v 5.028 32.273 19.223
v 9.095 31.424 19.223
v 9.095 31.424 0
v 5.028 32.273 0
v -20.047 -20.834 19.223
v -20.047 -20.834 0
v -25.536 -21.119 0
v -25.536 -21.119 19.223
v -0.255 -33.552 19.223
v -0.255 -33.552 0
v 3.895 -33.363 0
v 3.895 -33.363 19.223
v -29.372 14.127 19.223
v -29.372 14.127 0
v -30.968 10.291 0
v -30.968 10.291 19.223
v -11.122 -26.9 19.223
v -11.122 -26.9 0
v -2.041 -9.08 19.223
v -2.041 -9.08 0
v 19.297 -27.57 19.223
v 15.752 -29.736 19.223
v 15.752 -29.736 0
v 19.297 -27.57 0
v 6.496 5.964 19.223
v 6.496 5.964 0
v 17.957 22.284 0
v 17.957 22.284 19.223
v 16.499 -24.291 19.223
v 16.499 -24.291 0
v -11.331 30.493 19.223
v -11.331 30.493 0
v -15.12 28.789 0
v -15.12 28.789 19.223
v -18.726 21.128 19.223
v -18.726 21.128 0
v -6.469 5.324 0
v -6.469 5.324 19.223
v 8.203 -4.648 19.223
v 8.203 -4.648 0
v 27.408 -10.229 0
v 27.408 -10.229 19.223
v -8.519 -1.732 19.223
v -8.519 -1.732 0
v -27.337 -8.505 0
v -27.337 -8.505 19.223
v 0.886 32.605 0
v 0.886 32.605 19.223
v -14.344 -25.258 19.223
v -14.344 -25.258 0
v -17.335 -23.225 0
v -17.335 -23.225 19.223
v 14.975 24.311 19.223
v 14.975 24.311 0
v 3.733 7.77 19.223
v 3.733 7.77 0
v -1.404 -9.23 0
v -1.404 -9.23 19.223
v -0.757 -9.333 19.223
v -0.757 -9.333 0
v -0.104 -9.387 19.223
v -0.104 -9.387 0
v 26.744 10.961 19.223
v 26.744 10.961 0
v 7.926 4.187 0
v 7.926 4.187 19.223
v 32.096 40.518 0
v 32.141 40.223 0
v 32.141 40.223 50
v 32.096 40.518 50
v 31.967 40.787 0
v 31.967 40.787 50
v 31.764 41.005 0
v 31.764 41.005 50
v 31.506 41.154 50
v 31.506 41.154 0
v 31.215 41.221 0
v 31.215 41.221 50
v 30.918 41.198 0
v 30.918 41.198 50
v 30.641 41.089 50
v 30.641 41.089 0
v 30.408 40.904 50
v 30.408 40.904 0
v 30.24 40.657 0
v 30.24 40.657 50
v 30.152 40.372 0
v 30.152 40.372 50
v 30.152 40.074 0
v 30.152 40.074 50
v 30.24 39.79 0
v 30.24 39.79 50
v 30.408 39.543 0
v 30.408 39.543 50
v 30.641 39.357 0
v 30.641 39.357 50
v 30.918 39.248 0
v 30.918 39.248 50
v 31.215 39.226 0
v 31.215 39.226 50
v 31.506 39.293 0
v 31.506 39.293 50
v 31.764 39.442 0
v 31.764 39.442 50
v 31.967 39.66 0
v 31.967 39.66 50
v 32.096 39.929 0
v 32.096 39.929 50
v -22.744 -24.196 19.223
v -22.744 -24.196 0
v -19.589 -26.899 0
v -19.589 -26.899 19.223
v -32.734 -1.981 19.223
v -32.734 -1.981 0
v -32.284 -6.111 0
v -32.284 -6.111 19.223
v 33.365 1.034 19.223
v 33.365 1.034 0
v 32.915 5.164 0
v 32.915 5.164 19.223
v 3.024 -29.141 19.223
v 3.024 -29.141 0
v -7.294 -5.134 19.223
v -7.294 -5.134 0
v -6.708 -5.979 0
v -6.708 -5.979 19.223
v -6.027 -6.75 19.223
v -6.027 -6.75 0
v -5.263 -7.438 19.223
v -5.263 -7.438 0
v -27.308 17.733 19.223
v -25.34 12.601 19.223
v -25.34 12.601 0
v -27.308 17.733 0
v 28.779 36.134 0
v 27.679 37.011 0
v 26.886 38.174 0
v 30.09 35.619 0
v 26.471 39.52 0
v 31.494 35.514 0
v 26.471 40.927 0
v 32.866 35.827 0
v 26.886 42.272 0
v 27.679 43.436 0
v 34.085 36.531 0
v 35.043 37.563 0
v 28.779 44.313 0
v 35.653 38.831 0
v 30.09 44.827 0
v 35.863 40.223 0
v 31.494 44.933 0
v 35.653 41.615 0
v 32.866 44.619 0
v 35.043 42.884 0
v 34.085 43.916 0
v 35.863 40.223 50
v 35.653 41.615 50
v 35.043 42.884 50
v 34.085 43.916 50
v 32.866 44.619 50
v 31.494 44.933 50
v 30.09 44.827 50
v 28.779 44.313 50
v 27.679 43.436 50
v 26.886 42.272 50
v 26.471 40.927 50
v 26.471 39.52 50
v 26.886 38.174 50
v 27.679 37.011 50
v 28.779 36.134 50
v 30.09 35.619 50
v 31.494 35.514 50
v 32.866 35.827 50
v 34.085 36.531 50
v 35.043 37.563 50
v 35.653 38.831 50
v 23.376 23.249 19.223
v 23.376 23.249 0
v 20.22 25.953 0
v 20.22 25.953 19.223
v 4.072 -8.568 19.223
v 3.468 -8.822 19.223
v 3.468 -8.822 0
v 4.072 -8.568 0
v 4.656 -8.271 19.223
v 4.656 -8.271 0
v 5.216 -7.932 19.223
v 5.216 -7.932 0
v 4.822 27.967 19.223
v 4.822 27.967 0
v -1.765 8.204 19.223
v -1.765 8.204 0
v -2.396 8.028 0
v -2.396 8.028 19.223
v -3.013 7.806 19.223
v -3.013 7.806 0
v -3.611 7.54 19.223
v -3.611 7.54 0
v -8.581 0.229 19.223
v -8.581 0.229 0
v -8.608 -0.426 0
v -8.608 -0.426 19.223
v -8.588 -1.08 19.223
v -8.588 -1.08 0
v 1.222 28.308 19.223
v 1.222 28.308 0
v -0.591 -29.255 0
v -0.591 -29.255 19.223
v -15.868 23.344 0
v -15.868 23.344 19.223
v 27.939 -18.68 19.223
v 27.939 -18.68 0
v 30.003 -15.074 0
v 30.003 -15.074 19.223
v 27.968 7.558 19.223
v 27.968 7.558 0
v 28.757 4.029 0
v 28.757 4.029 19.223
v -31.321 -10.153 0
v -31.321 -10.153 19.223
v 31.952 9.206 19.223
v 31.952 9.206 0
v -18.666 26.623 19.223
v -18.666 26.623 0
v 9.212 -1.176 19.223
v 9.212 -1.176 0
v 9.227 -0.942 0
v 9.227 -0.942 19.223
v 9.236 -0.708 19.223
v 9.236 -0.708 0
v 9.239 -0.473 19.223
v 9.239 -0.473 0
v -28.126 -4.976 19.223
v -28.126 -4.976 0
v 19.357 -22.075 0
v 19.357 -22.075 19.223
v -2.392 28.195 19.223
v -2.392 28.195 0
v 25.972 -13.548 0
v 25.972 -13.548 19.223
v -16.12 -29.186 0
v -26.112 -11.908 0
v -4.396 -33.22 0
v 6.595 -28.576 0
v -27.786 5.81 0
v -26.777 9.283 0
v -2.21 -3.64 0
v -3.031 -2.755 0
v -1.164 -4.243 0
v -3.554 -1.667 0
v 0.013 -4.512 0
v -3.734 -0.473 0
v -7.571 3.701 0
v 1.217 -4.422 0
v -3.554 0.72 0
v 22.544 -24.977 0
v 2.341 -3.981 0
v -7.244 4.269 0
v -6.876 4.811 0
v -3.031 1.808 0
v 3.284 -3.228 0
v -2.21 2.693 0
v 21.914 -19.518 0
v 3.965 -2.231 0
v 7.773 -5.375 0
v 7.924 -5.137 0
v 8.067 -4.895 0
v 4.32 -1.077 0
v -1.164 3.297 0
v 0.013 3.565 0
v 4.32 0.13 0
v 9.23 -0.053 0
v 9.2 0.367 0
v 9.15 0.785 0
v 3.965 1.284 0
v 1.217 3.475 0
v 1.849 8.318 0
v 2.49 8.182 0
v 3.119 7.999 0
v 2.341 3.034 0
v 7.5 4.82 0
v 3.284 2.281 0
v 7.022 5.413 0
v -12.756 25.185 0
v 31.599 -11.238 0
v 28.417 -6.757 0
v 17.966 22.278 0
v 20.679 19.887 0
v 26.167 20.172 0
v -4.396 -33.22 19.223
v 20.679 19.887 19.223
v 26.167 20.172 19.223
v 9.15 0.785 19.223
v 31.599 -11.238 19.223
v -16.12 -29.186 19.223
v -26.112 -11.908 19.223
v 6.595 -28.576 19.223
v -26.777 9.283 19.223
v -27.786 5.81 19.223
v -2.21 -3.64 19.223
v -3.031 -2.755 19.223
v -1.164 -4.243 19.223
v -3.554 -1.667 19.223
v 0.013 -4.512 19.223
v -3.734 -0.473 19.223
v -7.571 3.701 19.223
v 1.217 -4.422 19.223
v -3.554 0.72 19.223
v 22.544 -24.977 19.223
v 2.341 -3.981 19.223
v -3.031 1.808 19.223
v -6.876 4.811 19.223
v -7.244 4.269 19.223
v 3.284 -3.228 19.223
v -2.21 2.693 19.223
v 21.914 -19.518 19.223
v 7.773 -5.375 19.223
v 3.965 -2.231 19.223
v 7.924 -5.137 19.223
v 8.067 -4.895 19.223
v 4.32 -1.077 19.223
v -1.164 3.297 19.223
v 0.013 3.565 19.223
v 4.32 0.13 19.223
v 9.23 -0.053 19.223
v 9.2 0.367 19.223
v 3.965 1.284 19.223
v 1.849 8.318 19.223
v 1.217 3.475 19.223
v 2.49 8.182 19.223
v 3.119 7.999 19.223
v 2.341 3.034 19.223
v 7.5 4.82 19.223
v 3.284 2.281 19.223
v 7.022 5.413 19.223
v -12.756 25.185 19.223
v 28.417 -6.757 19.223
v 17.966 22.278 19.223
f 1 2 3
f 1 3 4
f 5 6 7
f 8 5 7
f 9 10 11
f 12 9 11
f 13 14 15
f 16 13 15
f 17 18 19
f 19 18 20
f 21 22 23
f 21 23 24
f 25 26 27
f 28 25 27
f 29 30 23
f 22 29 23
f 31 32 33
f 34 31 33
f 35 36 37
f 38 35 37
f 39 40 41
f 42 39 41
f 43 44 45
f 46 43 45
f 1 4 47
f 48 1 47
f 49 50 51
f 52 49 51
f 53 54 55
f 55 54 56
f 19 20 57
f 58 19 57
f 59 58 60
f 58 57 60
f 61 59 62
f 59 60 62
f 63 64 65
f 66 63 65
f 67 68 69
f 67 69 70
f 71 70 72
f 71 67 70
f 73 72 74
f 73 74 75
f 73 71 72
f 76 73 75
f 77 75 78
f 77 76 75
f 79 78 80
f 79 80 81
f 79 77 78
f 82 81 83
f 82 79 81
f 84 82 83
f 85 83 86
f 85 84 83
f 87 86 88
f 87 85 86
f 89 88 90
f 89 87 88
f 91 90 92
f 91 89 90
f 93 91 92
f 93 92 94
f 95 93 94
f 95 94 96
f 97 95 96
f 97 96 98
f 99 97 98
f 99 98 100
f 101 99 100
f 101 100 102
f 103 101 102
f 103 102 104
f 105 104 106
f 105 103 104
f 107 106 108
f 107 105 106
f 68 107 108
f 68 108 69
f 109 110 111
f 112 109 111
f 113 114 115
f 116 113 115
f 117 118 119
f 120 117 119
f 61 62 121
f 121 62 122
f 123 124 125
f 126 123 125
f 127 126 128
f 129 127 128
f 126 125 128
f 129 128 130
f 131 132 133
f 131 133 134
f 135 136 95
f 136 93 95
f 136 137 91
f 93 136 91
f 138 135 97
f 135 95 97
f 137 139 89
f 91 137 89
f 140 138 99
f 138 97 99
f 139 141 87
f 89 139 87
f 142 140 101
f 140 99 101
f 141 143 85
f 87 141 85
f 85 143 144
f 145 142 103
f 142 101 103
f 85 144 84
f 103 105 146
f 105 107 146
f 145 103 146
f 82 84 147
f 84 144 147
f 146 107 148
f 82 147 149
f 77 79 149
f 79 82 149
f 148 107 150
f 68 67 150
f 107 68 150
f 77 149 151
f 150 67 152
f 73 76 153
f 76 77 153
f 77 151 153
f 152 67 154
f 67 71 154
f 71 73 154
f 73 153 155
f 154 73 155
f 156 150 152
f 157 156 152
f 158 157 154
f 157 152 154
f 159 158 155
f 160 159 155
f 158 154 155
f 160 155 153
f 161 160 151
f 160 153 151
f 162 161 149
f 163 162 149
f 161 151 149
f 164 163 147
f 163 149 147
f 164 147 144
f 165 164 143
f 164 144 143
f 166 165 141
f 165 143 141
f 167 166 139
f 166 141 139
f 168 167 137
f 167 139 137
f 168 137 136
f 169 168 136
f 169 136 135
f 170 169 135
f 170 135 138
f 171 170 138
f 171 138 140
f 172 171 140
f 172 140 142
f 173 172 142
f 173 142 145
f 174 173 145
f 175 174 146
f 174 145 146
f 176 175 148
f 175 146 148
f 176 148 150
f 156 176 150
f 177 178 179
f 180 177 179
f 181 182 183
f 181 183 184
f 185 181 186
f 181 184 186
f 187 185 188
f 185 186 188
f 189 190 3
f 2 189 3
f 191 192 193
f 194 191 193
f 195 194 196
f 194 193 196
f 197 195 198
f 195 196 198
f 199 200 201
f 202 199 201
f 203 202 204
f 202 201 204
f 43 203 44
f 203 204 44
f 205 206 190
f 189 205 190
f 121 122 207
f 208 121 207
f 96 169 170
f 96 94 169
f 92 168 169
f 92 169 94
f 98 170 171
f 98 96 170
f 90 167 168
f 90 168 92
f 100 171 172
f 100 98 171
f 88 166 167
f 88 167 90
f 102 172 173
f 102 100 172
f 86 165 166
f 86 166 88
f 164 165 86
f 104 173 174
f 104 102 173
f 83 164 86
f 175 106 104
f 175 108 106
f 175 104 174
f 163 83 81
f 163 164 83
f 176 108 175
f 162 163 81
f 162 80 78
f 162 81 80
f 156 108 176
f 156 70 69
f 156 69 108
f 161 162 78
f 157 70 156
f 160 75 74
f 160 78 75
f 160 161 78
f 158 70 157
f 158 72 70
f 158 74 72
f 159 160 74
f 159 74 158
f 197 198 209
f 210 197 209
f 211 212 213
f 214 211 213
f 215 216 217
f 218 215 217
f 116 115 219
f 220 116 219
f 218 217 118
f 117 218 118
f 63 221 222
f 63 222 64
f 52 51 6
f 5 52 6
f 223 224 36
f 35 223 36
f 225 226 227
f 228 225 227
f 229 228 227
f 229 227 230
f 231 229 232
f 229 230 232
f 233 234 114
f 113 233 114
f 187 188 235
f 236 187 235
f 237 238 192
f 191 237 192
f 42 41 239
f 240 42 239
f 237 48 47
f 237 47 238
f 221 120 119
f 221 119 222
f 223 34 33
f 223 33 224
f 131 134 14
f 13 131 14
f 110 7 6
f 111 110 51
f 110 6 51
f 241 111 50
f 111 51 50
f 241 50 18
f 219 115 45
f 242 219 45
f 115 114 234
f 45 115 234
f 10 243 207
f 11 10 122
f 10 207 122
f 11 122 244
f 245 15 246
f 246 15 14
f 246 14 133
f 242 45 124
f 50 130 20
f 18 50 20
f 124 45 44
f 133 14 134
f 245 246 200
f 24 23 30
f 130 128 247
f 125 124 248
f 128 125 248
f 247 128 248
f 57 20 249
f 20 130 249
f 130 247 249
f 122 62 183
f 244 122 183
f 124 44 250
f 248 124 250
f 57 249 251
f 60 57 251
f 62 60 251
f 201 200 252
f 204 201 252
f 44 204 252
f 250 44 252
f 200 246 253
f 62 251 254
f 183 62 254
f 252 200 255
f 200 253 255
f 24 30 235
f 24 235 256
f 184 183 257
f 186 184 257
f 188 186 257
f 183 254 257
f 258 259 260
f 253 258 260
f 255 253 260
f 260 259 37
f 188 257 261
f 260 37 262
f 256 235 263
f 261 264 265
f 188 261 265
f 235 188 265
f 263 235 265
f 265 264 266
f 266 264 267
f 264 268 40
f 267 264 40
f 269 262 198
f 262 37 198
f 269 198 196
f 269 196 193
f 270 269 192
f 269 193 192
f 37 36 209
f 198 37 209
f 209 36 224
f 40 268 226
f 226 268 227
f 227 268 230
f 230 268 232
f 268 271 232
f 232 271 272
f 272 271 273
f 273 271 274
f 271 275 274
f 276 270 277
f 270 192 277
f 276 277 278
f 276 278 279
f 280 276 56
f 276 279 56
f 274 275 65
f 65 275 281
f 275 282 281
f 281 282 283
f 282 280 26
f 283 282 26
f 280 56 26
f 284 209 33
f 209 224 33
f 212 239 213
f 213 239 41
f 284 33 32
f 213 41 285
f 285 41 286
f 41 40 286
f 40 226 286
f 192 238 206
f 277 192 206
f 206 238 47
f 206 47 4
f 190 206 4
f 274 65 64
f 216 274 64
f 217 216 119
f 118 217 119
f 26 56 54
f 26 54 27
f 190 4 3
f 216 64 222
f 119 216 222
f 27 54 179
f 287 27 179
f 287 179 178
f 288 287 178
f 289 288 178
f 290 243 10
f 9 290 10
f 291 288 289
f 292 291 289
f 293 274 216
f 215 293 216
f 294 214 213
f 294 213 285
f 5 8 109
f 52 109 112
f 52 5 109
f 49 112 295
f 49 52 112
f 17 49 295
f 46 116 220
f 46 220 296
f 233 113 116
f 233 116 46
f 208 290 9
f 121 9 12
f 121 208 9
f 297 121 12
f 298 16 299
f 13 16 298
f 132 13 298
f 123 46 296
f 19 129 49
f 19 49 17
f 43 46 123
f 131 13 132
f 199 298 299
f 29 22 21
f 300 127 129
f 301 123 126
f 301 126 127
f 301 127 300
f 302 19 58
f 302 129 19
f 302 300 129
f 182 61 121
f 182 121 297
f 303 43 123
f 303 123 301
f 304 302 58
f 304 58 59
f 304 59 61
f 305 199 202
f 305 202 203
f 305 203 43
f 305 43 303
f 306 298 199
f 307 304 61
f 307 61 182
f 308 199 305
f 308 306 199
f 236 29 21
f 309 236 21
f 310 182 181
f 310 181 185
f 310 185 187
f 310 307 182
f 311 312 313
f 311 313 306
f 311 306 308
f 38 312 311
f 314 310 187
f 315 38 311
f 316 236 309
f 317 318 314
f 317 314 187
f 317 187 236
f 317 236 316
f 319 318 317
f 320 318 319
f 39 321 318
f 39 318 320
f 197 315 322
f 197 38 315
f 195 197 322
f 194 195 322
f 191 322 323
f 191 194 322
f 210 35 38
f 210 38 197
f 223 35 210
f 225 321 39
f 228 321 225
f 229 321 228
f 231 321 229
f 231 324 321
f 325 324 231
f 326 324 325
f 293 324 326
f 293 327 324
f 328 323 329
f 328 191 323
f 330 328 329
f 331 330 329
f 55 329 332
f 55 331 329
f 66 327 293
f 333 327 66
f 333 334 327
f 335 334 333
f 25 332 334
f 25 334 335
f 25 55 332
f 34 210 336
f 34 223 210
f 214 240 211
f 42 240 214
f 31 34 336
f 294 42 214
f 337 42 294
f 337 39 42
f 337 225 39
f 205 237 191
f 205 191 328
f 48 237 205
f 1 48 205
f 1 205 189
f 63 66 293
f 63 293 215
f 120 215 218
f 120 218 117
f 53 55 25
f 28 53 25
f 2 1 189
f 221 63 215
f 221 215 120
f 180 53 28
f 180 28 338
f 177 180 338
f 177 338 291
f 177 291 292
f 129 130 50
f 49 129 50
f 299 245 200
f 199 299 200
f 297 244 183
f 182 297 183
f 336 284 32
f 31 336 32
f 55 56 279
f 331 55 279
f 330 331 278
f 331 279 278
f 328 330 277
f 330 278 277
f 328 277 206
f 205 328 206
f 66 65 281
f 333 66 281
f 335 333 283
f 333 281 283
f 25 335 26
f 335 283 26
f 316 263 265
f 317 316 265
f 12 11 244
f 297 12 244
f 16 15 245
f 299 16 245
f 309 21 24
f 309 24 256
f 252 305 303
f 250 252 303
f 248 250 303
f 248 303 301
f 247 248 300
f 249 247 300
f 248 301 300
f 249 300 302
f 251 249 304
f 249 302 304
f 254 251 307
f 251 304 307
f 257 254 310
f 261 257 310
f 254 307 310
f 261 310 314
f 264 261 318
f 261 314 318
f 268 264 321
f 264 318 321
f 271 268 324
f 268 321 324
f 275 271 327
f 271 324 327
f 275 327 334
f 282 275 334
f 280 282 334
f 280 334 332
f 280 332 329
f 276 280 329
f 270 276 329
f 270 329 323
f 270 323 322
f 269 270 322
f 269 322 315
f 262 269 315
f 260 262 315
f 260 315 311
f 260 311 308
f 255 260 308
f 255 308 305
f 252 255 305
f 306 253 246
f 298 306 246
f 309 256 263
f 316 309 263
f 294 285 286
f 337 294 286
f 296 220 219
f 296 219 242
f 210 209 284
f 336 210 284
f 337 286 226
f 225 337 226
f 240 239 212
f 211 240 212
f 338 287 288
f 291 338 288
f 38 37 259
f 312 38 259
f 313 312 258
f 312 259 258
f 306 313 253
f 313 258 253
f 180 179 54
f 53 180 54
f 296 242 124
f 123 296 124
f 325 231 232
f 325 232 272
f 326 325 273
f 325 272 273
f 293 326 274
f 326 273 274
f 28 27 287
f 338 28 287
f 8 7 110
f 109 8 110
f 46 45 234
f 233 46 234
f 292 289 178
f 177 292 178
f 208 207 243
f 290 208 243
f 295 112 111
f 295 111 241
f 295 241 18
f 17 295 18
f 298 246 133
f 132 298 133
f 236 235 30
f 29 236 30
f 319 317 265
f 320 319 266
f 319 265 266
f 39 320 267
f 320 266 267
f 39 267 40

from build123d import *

# Parameters (mm, degrees)
F0_R     = 4.7226333732
F1_DEPTH = 19.22295
F3_D     = 8.1
F0_R_2   = 4.7225
F0_R_3   = 1
F5_DEPTH = 50


with BuildPart() as f1:
    # F0 (on Top) → F1 (new body)
    with BuildSketch(Plane.XY):
        with BuildLine():
            Line((-3.6111849133, 7.5399878677), (-15.8682249749, 23.3439420857))
            Line((-15.8682249749, 23.3439420857), (-18.7257190256, 21.1277613394))
            Line((-18.7257190256, 21.1277613394), (-6.4686789639, 5.3238071213))
            ThreePointArc((-6.4686789639, 5.3238071213), (-5.153365355, 6.5781560129), (-3.6111849133, 7.5399878677))
        make_face()
        with BuildLine():
            Line((-2.3922839945, 28.1945188575), (-1.7654615012, 8.2043439318))
            ThreePointArc((-1.7654615012, 8.2043439318), (0.0359373411, 8.4460115605), (1.8489381062, 8.3176789567))
            Line((1.8489381062, 8.3176789567), (1.2221156129, 28.3078538824))
            Line((1.2221156129, 28.3078538824), (-2.3922839945, 28.1945188575))
        make_face()
        with BuildLine():
            Line((14.9754783728, 24.3110935543), (3.7326584103, 7.7702653014))
            ThreePointArc((3.7326584103, 7.7702653014), (5.1985184938, 6.9959722127), (6.4958647117, 5.963902272))
            Line((6.4958647117, 5.963902272), (17.957123341, 22.2844660446))
            Line((17.957123341, 22.2844660446), (14.9754783728, 24.3110935543))
        make_face()
        with BuildLine():
            Line((26.7436731606, 10.9608219028), (7.9255858385, 4.1873745133))
            ThreePointArc((7.9255858385, 4.1873745133), (8.7120882675, 2.5488218102), (9.1502847556, 0.784898663))
            Line((9.1502847556, 0.784898663), (27.9683720778, 7.5583460524))
            Line((27.9683720778, 7.5583460524), (26.7436731606, 10.9608219028))
        make_face()
        with BuildLine():
            Line((28.4172499462, -6.7569460852), (9.2117650183, -1.1757859295))
            ThreePointArc((9.2117650183, -1.1757859295), (8.8849417355, -2.9636974411), (8.2026421291, -4.6483066774))
            Line((8.2026421291, -4.6483066774), (27.4081270571, -10.2294668331))
            Line((27.4081270571, -10.2294668331), (28.4172499462, -6.7569460852))
        make_face()
        with BuildLine():
            ThreePointArc((7.7730097127, -5.3746599207), (6.6252793471, -6.7839704044), (5.2158089552, -7.9315043892))
            Line((5.2158089552, -7.9315043892), (19.3569592803, -22.074625243))
            Line((19.3569592803, -22.074625243), (21.9141600377, -19.5177807745))
            Line((21.9141600377, -19.5177807745), (7.7730097127, -5.3746599207))
        make_face()
        with BuildLine():
            ThreePointArc((3.4679055173, -8.8219522908), (1.7110002283, -9.28748944), (-0.1037888245, -9.3873980254))
            Line((-0.1037888245, -9.3873980254), (3.0235242493, -29.1413827612))
            Line((3.0235242493, -29.1413827612), (6.595218591, -28.5759370266))
            Line((6.595218591, -28.5759370266), (3.4679055173, -8.8219522908))
        make_face()
        with BuildLine():
            ThreePointArc((-2.0412645548, -9.0803936472), (-3.7362666617, -8.4243380938), (-5.2631866398, -7.4384595961))
            Line((-5.2631866398, -7.4384595961), (-14.3442381181, -25.257957458))
            Line((-14.3442381181, -25.257957458), (-11.1223160331, -26.8998915091))
            Line((-11.1223160331, -26.8998915091), (-2.0412645548, -9.0803936472))
        make_face()
        with BuildLine():
            ThreePointArc((-7.2943455838, -5.134238417), (-8.0808480128, -3.4956857139), (-8.5190445009, -1.7317625667))
            Line((-8.5190445009, -1.7317625667), (-27.337131823, -8.5052099561))
            Line((-27.337131823, -8.5052099561), (-26.1124329059, -11.9076858064))
            Line((-26.1124329059, -11.9076858064), (-7.2943455838, -5.134238417))
        make_face()
        with BuildLine():
            ThreePointArc((-8.5805247636, 0.2289220258), (-8.2537014807, 2.0168335374), (-7.5714018744, 3.7014427737))
            Line((-7.5714018744, 3.7014427737), (-26.7768868023, 9.2826029294))
            Line((-26.7768868023, 9.2826029294), (-27.7860096915, 5.8100821815))
            Line((-27.7860096915, 5.8100821815), (-8.5805247636, 0.2289220258))
        make_face()
        with BuildLine():
            ThreePointArc((-1.7654615012, 8.2043439318), (-2.7066336347, 7.9230361883), (-3.6111849133, 7.5399878677))
            ThreePointArc((-3.6111849133, 7.5399878677), (-5.153365355, 6.5781560129), (-6.4686789639, 5.3238071213))
            ThreePointArc((-6.4686789639, 5.3238071213), (-7.0647546716, 4.5430172762), (-7.5714018744, 3.7014427737))
            ThreePointArc((-7.5714018744, 3.7014427737), (-8.2537014807, 2.0168335374), (-8.5805247636, 0.2289220258))
            ThreePointArc((-8.5805247636, 0.2289220258), (-8.603823385, -0.7531147381), (-8.5190445009, -1.7317625667))
            ThreePointArc((-8.5190445009, -1.7317625667), (-8.0808480128, -3.4956857139), (-7.2943455838, -5.134238417))
            ThreePointArc((-7.2943455838, -5.134238417), (-6.3786526996, -6.3743985124), (-5.2631866398, -7.4384595961))
            ThreePointArc((-5.2631866398, -7.4384595961), (-3.7362666617, -8.4243380938), (-2.0412645548, -9.0803936472))
            ThreePointArc((-2.0412645548, -9.0803936472), (-1.0809880881, -9.2872949257), (-0.1037888245, -9.3873980254))
            ThreePointArc((-0.1037888245, -9.3873980254), (1.7110002283, -9.28748944), (3.4679055173, -8.8219522908))
            ThreePointArc((3.4679055173, -8.8219522908), (4.3663990183, -8.4249025961), (5.2158089552, -7.9315043892))
            ThreePointArc((5.2158089552, -7.9315043892), (6.6252793471, -6.7839704044), (7.7730097127, -5.3746599207))
            ThreePointArc((7.7730097127, -5.3746599207), (7.9964168957, -5.0165647953), (8.2026421291, -4.6483066774))
            ThreePointArc((8.2026421291, -4.6483066774), (8.8849417355, -2.9636974411), (9.2117650183, -1.1757859295))
            ThreePointArc((9.2117650183, -1.1757859295), (9.2325241962, -0.8248816032), (9.239447503, -0.4734319518))
            ThreePointArc((9.239447503, -0.4734319518), (9.2171289066, 0.1573108507), (9.1502847556, 0.784898663))
            ThreePointArc((9.1502847556, 0.784898663), (8.7120882675, 2.5488218102), (7.9255858385, 4.1873745133))
            ThreePointArc((7.9255858385, 4.1873745133), (7.2677052619, 5.1214949747), (6.4958647117, 5.963902272))
            ThreePointArc((6.4958647117, 5.963902272), (5.1985184938, 6.9959722127), (3.7326584103, 7.7702653014))
            ThreePointArc((3.7326584103, 7.7702653014), (2.8058856166, 8.0958896563), (1.8489381062, 8.3176789567))
            ThreePointArc((1.8489381062, 8.3176789567), (0.0359373411, 8.4460115605), (-1.7654615012, 8.2043439318))
        make_face()
        with Locations((0.3156201274, -0.4734319518)):
            Circle(F0_R, mode=Mode.SUBTRACT)
        with Locations((0.3156201274, -0.4734319518)):
            Circle(F0_R)
        Polygon((-26.7768868023, 9.2826029294), (-25.3404988946, 12.6012651793), (-27.3080936211, 17.7328409462), (-29.3721234408, 14.1271096793), (-30.9679598099, 10.291119149), (-27.7860096915, 5.8100821815), align=None)
        Polygon((-26.1124329059, -11.9076858064), (-27.337131823, -8.5052099561), (-28.125730323, -4.9760681687), (-32.7338124516, -1.981059328), (-32.2842519902, -6.1113634884), (-31.3205720714, -10.1527541005), align=None)
        Polygon((-11.1223160331, -26.8998915091), (-14.3442381181, -25.257957458), (-17.3349654811, -23.2251566341), (-20.0473325652, -20.8335475207), (-25.5357713458, -21.1190971868), (-22.7443374196, -24.1963384354), (-19.5892341875, -26.8994552773), (-16.1202195124, -29.1858179452), align=None)
        Polygon((6.595218591, -28.5759370266), (3.0235242493, -29.1413827612), (-0.5908753582, -29.2547177861), (-4.3963028452, -33.2199694176), (-0.2549184965, -33.5523137312), (3.895463587, -33.3629843188), align=None)
        Polygon((21.9141600377, -19.5177807745), (19.3569592803, -22.074625243), (16.4994652297, -24.2908059894), (15.7515261524, -29.7355361017), (19.2973235569, -27.5701636552), (22.5437681592, -24.977459563), align=None)
        Polygon((31.5992000647, -11.2379830526), (28.4172499462, -6.7569460852), (27.4081270571, -10.2294668331), (25.9717391493, -13.5481290829), (27.9393338758, -18.6797048499), (30.0033636956, -15.073973583), align=None)
        Polygon((31.9518123261, 9.2058901969), (26.7436731606, 10.9608219028), (27.9683720778, 7.5583460524), (28.7569705777, 4.029204265), (33.3650527063, 1.0341954243), (32.915492245, 5.1644995847), align=None)
        Polygon((20.2204744423, 25.9525913736), (14.9754783728, 24.3110935543), (17.957123341, 22.2844660446), (17.9662057359, 22.2782927304), (20.67857282, 19.8866836171), (26.1670116005, 20.1722332832), (23.3755776743, 23.2494745317), align=None)
        Polygon((0.8861587513, 32.6054498275), (-2.3922839945, 28.1945188575), (1.2221156129, 28.3078538824), (4.822219245, 27.9672908367), (9.0946176085, 31.4243287426), (5.0275430999, 32.2731055139), align=None)
        Polygon((-18.7257190256, 21.1277613394), (-15.8682249749, 23.3439420857), (-12.7555020193, 25.1845086157), (-11.3310550342, 30.4925637818), (-15.1202858977, 28.7886721981), (-18.6660833022, 26.6232997516), align=None)
    extrude(amount=F1_DEPTH)

    # F3 (through all)
    with Locations(Plane(origin=(0, 0, 0), x_dir=(1, 0, 0), z_dir=(0, 0, -1))):
        with Locations((0.3156201274, 0.4734319518)):
            Hole(F3_D / 2)


with BuildPart() as f5:
    # F0 (on Top) → F5 (new body)
    with BuildSketch(Plane.XY):
        with Locations((31.1406832188, 40.2233861387)):
            Circle(F0_R_2)
        with Locations((31.1406832188, 40.2233861387)):
            Circle(F0_R_3, mode=Mode.SUBTRACT)
    extrude(amount=F5_DEPTH)


solid = Compound([f1.part, f5.part])
